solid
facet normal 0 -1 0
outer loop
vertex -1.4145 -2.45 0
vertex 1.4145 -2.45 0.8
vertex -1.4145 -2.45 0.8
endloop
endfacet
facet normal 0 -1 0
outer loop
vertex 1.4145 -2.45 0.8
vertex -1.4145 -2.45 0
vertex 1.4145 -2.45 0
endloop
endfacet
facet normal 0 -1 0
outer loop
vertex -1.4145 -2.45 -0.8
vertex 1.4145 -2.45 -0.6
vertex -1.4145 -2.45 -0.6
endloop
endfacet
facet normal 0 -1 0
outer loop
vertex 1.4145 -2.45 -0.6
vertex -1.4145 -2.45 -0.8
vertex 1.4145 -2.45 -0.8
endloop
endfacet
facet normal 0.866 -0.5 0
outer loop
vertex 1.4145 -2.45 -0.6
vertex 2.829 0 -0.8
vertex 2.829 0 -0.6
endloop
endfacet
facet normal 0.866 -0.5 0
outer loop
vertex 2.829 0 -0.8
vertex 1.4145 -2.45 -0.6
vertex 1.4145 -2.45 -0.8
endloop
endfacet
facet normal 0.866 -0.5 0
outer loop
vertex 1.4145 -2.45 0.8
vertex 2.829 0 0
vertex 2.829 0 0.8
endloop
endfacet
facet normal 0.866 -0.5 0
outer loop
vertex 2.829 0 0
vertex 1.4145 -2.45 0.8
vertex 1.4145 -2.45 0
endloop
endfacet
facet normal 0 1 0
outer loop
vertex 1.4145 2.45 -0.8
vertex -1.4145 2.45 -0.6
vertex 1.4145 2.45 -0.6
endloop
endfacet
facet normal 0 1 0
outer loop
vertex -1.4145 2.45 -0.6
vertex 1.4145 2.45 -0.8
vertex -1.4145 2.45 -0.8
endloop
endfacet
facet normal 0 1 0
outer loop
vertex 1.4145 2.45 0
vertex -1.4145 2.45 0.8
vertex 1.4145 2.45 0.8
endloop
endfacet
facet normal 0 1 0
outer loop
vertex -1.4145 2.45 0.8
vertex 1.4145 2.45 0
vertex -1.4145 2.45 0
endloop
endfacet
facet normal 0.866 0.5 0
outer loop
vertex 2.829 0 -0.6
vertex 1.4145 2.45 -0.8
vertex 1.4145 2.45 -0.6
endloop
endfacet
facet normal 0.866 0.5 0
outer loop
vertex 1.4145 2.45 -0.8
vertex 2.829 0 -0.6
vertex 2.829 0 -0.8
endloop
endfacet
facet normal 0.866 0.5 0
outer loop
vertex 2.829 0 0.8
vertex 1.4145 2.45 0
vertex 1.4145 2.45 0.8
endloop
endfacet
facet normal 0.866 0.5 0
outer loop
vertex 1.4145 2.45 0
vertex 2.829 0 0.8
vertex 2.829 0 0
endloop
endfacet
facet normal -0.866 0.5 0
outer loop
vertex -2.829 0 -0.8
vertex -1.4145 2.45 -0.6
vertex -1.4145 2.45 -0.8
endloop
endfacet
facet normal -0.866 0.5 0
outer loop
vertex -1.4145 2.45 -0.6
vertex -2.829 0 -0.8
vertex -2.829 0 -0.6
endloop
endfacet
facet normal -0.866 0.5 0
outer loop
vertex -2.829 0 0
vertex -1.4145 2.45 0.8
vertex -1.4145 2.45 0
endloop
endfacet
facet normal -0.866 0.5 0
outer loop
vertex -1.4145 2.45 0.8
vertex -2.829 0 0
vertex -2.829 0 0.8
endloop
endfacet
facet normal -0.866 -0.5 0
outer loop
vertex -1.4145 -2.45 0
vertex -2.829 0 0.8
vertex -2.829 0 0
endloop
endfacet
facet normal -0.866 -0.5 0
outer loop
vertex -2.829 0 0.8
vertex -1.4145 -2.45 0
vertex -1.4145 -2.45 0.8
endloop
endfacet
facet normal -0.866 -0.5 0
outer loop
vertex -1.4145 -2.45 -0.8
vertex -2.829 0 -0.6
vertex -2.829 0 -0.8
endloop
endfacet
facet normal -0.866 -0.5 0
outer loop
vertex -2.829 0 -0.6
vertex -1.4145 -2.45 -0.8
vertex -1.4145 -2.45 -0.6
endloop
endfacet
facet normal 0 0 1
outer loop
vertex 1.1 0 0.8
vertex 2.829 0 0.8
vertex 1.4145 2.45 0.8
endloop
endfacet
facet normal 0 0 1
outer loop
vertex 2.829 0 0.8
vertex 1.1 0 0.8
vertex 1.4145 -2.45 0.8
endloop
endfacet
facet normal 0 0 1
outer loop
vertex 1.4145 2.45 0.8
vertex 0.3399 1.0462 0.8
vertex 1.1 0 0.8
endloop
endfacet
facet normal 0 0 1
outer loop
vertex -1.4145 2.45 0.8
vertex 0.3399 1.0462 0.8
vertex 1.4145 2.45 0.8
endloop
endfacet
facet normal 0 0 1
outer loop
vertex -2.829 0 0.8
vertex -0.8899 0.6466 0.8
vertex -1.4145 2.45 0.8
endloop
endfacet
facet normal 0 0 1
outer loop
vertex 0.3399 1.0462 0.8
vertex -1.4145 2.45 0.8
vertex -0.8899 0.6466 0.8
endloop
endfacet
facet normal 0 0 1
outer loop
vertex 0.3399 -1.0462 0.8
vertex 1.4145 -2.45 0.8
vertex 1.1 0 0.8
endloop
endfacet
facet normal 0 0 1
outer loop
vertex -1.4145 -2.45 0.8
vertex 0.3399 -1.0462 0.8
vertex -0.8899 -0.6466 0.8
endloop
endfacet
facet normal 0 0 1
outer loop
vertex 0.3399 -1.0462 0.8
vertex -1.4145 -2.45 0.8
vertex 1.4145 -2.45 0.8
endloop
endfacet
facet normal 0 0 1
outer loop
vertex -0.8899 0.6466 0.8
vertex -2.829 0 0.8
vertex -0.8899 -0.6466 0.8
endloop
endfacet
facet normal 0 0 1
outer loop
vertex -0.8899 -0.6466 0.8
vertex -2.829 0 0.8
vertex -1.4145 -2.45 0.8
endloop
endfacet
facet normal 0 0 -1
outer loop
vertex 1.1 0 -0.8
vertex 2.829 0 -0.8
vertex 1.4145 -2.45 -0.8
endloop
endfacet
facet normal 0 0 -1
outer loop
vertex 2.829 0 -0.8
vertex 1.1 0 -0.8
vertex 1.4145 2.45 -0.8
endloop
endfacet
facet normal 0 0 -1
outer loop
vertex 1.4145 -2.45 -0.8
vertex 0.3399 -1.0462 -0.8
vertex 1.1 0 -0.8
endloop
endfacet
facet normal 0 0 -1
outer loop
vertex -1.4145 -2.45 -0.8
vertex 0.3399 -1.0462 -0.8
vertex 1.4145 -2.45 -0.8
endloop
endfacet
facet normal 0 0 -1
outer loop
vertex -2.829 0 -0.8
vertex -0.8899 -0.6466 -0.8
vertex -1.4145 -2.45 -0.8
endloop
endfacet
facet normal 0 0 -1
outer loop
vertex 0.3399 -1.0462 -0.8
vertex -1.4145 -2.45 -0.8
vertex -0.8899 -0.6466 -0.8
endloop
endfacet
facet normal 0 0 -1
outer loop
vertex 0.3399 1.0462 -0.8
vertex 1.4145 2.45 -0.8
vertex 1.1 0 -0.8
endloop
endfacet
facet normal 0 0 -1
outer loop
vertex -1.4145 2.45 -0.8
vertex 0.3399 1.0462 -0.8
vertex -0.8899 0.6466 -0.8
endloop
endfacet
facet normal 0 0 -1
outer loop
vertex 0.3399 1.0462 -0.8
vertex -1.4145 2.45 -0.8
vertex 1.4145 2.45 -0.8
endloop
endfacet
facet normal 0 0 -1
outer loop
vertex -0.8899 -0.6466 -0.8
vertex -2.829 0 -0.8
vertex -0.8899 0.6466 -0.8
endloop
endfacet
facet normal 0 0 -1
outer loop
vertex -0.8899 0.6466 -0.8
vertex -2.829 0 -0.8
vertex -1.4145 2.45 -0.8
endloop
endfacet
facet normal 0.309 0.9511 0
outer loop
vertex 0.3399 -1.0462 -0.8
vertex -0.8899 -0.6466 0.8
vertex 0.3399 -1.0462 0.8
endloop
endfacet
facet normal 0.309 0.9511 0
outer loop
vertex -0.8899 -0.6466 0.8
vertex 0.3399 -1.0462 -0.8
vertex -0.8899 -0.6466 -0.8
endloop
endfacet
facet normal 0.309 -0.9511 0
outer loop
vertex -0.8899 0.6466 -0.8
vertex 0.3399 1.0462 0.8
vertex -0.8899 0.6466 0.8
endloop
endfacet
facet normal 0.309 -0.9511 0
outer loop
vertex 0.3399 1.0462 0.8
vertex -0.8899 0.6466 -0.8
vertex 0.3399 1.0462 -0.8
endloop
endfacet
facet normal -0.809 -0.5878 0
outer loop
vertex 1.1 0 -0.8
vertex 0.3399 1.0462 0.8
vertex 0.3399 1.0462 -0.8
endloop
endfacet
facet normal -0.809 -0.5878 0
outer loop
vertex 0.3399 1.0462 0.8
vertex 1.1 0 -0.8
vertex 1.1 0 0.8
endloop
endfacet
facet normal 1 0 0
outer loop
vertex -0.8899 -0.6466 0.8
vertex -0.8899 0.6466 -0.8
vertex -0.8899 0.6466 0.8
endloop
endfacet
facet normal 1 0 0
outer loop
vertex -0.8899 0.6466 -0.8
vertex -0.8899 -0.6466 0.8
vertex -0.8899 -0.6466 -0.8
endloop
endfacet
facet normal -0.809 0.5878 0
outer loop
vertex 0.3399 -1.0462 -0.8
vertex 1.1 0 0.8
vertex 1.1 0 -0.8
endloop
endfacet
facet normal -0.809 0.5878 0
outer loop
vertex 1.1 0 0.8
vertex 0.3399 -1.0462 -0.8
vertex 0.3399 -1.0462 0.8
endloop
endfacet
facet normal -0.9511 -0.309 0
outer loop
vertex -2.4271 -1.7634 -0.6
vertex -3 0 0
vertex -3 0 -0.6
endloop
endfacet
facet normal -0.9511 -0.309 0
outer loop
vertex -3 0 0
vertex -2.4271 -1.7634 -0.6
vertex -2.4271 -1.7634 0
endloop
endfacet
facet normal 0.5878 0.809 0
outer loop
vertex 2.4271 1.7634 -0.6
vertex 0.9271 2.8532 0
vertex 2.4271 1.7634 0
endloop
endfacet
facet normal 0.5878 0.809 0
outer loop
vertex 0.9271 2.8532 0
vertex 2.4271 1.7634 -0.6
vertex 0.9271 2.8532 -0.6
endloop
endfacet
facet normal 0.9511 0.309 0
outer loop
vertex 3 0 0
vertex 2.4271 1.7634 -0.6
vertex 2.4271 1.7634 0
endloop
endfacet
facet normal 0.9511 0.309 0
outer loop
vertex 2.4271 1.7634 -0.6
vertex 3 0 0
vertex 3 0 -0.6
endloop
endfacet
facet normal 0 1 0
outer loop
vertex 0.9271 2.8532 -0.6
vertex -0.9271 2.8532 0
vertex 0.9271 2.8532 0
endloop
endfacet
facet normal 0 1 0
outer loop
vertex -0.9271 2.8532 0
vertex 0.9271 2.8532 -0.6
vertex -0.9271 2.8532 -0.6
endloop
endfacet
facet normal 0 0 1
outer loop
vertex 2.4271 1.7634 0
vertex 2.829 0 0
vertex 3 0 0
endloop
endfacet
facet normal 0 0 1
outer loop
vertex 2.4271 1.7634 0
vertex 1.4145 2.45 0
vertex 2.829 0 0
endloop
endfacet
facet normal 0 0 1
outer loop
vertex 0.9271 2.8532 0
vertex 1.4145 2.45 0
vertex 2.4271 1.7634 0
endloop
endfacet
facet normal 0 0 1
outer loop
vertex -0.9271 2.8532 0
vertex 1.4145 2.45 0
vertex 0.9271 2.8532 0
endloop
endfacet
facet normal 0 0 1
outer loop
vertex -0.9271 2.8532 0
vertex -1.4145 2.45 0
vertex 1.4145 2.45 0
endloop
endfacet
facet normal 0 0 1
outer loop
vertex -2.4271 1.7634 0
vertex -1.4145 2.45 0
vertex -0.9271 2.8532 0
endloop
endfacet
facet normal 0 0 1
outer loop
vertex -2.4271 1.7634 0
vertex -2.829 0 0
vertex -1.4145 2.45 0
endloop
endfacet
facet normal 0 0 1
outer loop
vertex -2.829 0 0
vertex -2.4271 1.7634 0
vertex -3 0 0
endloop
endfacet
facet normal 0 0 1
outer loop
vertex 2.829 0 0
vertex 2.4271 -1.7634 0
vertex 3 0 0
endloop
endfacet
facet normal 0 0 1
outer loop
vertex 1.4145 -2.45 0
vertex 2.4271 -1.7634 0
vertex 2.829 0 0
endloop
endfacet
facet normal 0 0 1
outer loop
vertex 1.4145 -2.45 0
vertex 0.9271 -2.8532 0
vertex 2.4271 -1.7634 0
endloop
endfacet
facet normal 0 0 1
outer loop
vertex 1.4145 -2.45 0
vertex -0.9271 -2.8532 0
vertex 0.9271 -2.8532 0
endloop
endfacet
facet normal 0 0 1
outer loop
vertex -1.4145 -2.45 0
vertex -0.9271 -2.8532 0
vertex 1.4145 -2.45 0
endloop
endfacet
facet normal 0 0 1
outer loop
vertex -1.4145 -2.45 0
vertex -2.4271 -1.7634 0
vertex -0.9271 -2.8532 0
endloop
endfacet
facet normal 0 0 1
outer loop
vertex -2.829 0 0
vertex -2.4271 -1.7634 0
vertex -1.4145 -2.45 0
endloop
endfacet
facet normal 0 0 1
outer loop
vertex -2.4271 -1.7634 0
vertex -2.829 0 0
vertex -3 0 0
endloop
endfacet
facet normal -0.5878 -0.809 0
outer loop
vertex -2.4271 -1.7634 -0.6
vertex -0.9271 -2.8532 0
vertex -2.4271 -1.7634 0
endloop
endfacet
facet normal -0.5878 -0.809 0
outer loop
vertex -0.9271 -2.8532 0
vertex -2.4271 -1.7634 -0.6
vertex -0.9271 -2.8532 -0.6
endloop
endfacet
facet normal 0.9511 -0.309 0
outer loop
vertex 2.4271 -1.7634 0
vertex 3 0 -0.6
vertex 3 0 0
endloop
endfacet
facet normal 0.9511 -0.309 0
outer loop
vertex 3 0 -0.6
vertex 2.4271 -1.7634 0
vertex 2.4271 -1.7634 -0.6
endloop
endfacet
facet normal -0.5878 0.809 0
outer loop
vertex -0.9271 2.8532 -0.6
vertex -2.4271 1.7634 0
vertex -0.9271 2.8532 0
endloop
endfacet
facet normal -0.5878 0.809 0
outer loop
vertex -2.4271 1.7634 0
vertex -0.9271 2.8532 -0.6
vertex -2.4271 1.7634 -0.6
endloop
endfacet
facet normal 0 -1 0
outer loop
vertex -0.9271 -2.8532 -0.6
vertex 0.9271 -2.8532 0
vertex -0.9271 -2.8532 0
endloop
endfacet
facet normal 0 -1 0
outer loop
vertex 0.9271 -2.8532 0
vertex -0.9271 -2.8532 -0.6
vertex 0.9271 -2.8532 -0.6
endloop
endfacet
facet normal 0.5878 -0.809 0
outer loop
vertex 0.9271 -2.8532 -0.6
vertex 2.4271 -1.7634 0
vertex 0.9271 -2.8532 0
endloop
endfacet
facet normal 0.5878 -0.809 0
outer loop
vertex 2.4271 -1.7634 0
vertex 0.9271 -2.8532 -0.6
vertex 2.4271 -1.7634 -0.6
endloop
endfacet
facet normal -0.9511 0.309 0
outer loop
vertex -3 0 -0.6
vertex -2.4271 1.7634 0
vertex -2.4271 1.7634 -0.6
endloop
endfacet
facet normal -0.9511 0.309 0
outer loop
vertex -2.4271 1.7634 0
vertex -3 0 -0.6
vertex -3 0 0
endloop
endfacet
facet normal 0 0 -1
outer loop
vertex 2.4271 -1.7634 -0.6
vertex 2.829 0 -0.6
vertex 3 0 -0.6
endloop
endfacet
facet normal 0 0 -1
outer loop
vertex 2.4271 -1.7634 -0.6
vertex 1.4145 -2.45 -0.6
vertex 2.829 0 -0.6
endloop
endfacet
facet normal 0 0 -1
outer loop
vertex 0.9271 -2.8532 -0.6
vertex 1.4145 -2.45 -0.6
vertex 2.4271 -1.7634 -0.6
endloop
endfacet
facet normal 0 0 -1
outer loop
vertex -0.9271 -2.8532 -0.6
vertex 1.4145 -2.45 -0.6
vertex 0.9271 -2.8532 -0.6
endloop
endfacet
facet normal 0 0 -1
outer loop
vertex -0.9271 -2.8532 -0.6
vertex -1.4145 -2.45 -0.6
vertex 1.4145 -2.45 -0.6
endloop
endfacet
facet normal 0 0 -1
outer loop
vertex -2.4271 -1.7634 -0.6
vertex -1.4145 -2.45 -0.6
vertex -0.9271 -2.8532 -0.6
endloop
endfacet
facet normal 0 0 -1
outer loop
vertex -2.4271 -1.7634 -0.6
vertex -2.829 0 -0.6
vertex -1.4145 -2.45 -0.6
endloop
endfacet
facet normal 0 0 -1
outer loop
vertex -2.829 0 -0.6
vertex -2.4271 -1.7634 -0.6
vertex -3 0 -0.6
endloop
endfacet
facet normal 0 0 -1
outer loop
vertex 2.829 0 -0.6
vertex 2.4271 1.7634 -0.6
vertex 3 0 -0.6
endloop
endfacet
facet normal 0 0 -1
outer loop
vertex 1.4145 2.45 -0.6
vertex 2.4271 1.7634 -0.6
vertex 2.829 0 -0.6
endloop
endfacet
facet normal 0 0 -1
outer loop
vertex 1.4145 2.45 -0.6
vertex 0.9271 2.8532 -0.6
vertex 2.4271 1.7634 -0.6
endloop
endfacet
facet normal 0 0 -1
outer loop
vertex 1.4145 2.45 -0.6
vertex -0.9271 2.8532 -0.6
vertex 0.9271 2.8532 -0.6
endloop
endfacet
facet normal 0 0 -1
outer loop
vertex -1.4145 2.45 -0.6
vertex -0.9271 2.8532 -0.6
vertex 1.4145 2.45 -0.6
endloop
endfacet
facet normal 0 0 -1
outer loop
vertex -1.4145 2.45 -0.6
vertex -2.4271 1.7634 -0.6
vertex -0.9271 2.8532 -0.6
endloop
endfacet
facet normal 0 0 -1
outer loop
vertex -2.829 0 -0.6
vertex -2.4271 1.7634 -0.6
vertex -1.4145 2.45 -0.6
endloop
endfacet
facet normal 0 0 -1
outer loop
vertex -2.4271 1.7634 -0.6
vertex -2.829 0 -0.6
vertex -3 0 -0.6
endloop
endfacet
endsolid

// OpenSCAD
// Parameters
thread_diameter_mm = 2; //[1:4:0.1]
across_flats_mm = 4.9; //[2.45:9.8:0.1]
thickness_mm = 1.6; //[0.8:3.2:0.1]
hole_type = 0; //[0:1:1]
thread_pitch_mm = 0.4; //[0.2:1:0.05]
chamfer_mm = 0; //[0:0.6:0.05]
corner_fillet_mm = 0; //[0:0.6:0.05]
overlap_mm = 0.8; //[0.2:2:0.1]
hex_circumradius_mm = 2.829; //[1.4145:5.658:0.001]
hole_diameter_clearance_mm = 2.2; //[2:2.6:0.05]
hole_diameter_tapped_mm = 1.6; //[1.2:2:0.05]
washer_outer_diameter_mm = 6; //[3:12:0.1]
washer_thickness_mm = 0.6; //[0.3:1.2:0.05]

// Nut and Washer - complete geometry
module nut_and_washer() {
  color("DimGray") {
    // Hex Nut Body
    difference() {
      cylinder(r=hex_circumradius_mm, h=thickness_mm, center=true, $fn=6);
      // Central Thread or Clearance Hole
      cylinder(r=((1-hole_type)*(hole_diameter_clearance_mm/2) + hole_type*(hole_diameter_tapped_mm/2)), 
               h=thickness_mm + 2*overlap_mm, center=true);
    }
    
    // Washer Ring
    translate([0, 0, -(thickness_mm/2 + washer_thickness_mm/2 - overlap_mm)]) {
      difference() {
        cylinder(r=washer_outer_diameter_mm/2, h=washer_thickness_mm, center=true);
        cylinder(r=((1-hole_type)*(hole_diameter_clearance_mm/2) + hole_type*(hole_diameter_tapped_mm/2)), 
                 h=washer_thickness_mm + 2*overlap_mm, center=true);
      }
    }
  }
}

// Assembly
module assembly() {
  nut_and_washer();
}

assembly();
